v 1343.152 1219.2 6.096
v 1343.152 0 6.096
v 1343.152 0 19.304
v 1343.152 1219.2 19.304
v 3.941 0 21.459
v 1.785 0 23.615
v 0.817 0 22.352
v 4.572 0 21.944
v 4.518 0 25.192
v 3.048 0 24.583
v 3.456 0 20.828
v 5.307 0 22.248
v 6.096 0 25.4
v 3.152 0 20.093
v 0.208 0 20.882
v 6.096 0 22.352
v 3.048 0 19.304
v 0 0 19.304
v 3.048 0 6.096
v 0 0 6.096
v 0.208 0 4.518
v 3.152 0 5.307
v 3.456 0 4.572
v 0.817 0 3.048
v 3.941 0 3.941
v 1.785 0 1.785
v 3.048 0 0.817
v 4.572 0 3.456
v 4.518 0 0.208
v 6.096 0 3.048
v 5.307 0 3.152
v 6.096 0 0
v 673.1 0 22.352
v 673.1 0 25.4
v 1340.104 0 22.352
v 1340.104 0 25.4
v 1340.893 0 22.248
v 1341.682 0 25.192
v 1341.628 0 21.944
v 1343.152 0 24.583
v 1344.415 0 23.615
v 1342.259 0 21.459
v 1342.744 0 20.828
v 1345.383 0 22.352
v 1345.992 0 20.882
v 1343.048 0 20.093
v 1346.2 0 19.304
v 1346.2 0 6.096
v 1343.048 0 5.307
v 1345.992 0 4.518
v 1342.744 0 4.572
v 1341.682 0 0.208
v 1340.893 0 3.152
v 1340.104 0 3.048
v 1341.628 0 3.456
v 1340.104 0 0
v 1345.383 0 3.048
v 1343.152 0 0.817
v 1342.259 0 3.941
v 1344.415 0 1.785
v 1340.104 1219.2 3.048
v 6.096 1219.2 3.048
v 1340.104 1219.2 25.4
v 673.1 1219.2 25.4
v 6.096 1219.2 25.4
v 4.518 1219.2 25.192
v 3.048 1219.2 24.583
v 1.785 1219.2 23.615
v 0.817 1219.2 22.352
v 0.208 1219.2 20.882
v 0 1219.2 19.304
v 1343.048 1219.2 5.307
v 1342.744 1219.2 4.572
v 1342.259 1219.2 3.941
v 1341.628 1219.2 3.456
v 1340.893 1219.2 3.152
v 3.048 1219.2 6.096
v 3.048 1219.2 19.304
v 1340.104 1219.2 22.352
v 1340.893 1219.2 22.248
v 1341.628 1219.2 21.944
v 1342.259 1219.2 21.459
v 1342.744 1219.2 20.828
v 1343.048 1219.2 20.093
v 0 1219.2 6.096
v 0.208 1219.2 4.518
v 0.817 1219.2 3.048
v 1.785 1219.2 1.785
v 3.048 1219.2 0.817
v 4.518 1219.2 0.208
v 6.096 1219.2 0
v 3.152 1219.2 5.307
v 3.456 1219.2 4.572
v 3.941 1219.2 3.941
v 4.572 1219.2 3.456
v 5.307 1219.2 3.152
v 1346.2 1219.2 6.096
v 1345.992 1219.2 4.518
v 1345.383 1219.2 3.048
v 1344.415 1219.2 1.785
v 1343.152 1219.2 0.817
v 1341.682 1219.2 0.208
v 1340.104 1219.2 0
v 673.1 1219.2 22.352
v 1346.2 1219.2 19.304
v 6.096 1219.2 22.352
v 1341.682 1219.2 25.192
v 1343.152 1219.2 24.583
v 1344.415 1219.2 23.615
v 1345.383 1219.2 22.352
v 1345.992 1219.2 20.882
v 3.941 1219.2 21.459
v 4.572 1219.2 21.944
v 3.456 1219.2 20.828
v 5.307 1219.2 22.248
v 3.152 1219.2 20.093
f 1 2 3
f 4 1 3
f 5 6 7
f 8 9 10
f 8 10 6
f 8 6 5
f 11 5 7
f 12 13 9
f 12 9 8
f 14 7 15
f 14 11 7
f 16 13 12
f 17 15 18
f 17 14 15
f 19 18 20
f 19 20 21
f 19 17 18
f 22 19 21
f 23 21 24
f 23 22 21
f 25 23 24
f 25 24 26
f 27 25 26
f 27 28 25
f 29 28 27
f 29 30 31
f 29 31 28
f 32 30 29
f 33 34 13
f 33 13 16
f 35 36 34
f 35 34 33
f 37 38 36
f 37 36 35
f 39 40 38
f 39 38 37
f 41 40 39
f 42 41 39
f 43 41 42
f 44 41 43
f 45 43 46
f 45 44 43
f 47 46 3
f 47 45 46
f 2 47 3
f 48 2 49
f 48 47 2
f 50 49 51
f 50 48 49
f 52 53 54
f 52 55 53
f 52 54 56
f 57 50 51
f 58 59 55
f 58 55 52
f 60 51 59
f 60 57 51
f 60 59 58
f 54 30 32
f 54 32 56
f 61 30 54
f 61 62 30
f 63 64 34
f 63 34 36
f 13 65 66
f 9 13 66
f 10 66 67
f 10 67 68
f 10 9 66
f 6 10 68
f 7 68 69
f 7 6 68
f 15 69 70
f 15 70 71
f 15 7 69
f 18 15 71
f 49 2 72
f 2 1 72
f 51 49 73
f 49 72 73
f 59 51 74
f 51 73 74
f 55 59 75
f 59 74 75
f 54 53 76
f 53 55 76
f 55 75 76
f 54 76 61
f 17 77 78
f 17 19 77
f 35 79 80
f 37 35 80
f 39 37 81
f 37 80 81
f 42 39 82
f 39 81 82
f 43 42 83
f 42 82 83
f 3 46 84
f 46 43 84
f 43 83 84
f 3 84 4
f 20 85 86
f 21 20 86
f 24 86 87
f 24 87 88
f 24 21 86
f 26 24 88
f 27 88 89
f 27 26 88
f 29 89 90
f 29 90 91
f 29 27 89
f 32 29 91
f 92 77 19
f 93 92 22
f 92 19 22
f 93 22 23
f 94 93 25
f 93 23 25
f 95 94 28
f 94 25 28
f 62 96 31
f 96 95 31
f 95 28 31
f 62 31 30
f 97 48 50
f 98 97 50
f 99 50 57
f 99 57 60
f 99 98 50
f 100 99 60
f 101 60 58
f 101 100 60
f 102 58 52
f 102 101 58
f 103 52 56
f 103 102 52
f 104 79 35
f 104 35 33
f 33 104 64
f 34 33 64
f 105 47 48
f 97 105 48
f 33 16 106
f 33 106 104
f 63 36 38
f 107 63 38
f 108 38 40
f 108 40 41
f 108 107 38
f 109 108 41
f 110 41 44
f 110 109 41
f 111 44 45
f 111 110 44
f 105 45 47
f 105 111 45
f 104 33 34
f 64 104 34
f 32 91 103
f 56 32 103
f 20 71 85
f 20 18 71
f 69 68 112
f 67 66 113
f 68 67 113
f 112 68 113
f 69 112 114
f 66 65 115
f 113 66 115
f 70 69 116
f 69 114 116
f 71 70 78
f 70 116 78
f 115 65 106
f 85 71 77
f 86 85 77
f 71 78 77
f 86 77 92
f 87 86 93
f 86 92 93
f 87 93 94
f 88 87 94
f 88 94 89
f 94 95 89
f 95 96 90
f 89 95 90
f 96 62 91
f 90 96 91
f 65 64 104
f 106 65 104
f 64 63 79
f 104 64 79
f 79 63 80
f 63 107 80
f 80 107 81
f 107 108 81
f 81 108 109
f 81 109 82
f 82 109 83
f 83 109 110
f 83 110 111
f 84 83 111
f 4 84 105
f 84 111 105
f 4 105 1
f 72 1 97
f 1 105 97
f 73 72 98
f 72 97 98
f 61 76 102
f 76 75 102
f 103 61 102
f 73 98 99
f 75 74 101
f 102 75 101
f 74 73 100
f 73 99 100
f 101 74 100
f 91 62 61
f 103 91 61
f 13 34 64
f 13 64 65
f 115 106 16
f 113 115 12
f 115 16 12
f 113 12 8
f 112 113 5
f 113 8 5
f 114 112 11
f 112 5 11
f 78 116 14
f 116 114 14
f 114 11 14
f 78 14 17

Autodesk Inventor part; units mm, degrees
ref_plane "YZ Plane" through (0, 0, 0) normal (1, 0, 0) x (0, 1, 0)
ref_plane "XZ Plane" through (0, 0, 0) normal (0, 1, 0) x (-1, 0, 0)
ref_plane "XY Plane" through (0, 0, 0) normal (0, 0, 1) x (1, 0, 0)
sketch "Sketch1" plane through (0, 0, 0) normal (0, 0, 1) x (1, 0, 0)
  line L0 (0, 0) -> (1346.2, 0)
  line L1 (1346.2, 0) -> (1346.2, 1219.2)
  line L2 (1346.2, 1219.2) -> (0, 1219.2)
  line L3 (0, 1219.2) -> (0, 0)
  dimension "d0" = 1346.2
  dimension "d1" = 1219.2
extrude "Plate1" add sketch "Sketch1" along normal blind 3.048
sketch "Sketch2" plane through (1343.152, 1219.2, 0) normal (1, 0, 0) x (0, 1, 0)
  line L0 (-1219.2, 0) -> (0, 0)
  line L1 (0, 0) -> (0, 25.4)
  line L2 (0, 25.4) -> (-1219.2, 25.4)
  line L3 (-1219.2, 25.4) -> (-1219.2, 0)
edge flange "Flange1" height 25.4 angle 90 thickness 3.048 bend radius 3.048 thickness toward (1, 0, 0) relief tear relief width 3.048 relief depth 1.524 corner gap 3.048 corner form 0 edges at (1346.2, 609.6, 3.048) (0, 609.6, 3.048) wall of the first edge with corners at (1343.152, 0, 0) (1343.152, 1219.2, 0) (1343.152, 1219.2, 25.4) (1343.152, 0, 25.4)
bend "Bend1"
corner "Corner1"
sketch "Sketch3" plane through (0, 0, 22.352) normal (0, 0, 1) x (1, 0, 0)
  line L0 (0, 1219.2) -> (0, 0)
  line L1 (0, 0) -> (673.099873, 0)
  line L2 (673.099873, 0) -> (673.099873, 1219.2)
  line L3 (673.099873, 1219.2) -> (0, 1219.2)
edge flange "Flange2" height 673.099873 angle 90 thickness 3.048 bend radius 3.048 thickness toward (0, 0, 1) relief tear relief width 3.048 relief depth 1.524 corner gap 3.048 corner form 0 edges at (3.048, 609.6, 25.4) (1343.152, 609.6, 25.4) wall of the first edge with corners at (0, 1219.2, 22.352) (0, 0, 22.352) (673.099873, 0, 22.352) (673.099873, 1219.2, 22.352)
bend "Bend2"
corner "Corner2"
equation "\"d3\" = BendReliefWidth"
equation "\"d4\" = BendReliefDepth"
equation "\"d5\" = MinimumRemnant"
equation "\"d6\" = BendRadius"
equation "\"d9\" = BendRadius"
equation "\"d10\" = CornerReliefSize"
equation "\"d11\" = GapSize"
equation "\"d12\" = JacobiRadiusSize"
equation "\"d13\" = BendReliefWidth"
equation "\"d14\" = BendReliefDepth"
equation "\"d15\" = MinimumRemnant"
equation "\"d16\" = BendRadius"
equation "\"d19\" = BendRadius"
equation "\"d20\" = CornerReliefSize"
equation "\"d21\" = GapSize"
equation "\"d22\" = JacobiRadiusSize"
equation "\"BendRadius\" = Thickness"
equation "\"BendReliefWidth\" = Thickness"
equation "\"BendReliefDepth\" = 0.5 * Thickness"
equation "\"CornerReliefSize\" = 4 * Thickness"
equation "\"MinimumRemnant\" = 2 * Thickness"
equation "\"TransitionRadius\" = BendRadius"
equation "\"JacobiRadiusSize\" = BendRadius"
equation "\"GapSize\" = Thickness"
equation "\"d2\" = BendRadius"
equation "\"Thickness\" = 3.048"
properties part number "top" material "Polycarbonate, Clear"
